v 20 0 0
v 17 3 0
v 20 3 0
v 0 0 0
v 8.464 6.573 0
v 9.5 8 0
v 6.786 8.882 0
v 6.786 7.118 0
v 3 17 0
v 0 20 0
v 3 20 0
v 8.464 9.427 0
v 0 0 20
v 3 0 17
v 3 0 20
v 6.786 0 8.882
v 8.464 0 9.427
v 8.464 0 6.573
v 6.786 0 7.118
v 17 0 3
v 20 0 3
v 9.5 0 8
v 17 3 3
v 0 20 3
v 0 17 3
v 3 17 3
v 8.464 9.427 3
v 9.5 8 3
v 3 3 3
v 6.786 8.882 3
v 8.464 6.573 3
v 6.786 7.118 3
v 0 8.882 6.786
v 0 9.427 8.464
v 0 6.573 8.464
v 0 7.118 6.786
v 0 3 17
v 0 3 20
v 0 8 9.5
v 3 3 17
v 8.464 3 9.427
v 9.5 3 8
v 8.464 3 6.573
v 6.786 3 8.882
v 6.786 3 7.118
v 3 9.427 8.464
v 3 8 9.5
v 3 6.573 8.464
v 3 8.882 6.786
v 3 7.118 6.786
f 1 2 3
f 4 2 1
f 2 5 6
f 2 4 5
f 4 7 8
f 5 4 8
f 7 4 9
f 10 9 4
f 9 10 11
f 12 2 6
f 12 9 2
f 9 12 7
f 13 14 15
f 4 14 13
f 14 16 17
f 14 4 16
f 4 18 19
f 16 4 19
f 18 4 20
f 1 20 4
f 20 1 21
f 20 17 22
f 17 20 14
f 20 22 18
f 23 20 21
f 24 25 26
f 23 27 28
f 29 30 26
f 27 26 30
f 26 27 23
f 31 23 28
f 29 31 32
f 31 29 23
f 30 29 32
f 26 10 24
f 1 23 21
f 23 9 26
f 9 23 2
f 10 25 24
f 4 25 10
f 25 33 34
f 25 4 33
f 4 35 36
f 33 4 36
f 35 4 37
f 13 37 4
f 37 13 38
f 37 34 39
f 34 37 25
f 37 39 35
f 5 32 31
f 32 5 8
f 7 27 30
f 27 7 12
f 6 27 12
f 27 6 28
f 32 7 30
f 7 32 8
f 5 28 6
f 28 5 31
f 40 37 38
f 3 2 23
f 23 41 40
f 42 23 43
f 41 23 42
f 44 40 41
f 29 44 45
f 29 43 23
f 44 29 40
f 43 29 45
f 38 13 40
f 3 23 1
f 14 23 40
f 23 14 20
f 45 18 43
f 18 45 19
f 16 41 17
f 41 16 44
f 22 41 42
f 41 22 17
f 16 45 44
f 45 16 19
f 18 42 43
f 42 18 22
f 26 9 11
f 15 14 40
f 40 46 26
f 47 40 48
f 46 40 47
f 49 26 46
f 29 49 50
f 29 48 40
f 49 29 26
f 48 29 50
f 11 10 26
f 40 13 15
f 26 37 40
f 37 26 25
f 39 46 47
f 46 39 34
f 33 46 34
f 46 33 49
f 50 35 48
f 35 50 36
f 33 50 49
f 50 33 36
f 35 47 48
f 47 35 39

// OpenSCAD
// CSG file generated from FreeCAD 1.0.2
group() {
 group(){
// x-y plane triangle
difference() {
    linear_extrude(height=3) polygon(points=[[0,0],[20,0],[0,20]]);
    translate([8,8,-1]) cylinder(h=5, d=3);
}

// y-z plane triangle (rotated 90 degrees around x-axis)
difference() {
    translate([0,3,0]) rotate([90,0,0]) linear_extrude(height=3) polygon(points=[[0,0],[20,0],[0,20]]);
    translate([8,3,8]) rotate([90,0,0]) cylinder(h=5, d=3);
}

// x-z plane triangle (rotated 90 degrees around y-axis)
difference() {
    translate([3,0,0]) rotate([0,-90,0]) linear_extrude(height=3) polygon(points=[[0,0],[20,0],[0,20]]);
    translate([3,8,8]) rotate([0,-90,0]) cylinder(h=5, d=3);
}
 }
}
